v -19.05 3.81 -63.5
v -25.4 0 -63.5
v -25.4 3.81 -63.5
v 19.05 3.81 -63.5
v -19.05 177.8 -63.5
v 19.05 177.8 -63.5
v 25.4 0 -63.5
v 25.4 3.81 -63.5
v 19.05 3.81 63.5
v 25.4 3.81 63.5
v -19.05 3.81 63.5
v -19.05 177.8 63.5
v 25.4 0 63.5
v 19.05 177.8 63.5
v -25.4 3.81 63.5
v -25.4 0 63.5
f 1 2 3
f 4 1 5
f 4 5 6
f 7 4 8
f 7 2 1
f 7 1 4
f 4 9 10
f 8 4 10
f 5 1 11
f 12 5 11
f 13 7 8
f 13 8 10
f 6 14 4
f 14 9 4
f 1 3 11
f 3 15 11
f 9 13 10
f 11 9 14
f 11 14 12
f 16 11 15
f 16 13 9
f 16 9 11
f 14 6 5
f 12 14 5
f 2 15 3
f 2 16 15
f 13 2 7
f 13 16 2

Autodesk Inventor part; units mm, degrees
ref_plane "YZ Plane" through (0, 0, 0) normal (1, 0, 0) x (0, 1, 0)
ref_plane "XZ Plane" through (0, 0, 0) normal (0, 1, 0) x (-1, 0, 0)
ref_plane "XY Plane" through (0, 0, 0) normal (0, 0, 1) x (1, 0, 0)
sketch "Sketch1" plane through (0, 0, 0) normal (0, 1, 0) x (-1, 0, 0)
  line L0 (0, -88.9) -> (0, 88.9) projected
  line L1 (-26.67, 0) -> (26.67, 0) projected
  line L2 (26.67, 0) -> (-26.67, 0) projected
  line L3 (0, -88.9) -> (0, 88.9) projected
  line L4 (19.05, 63.5) -> (-19.05, 63.5)
  line L5 (-19.05, 63.5) -> (-19.05, -63.5)
  line L6 (-19.05, -63.5) -> (19.05, -63.5)
  line L7 (19.05, -63.5) -> (19.05, 63.5)
  line L8 (19.05, 63.5) -> (-19.05, -63.5) construction
  line L9 (-19.05, 63.5) -> (19.05, -63.5) construction
  point P0 (0, 0)
  dimension "d0" = 38.1
  dimension "d1" = 127
extrude "Extrusion1" add sketch "Sketch1" along normal blind 177.8
sketch "Sketch2" plane through (0, 0, 0) normal (0, -1, 0) x (1, 0, 0)
  line L0 (-25.4, -63.5) -> (25.4, -63.5)
  line L1 (25.4, -63.5) -> (25.4, 63.5)
  line L2 (25.4, 63.5) -> (-25.4, 63.5)
  line L3 (-25.4, 63.5) -> (-25.4, -63.5)
  line L4 (-25.4, -63.5) -> (25.4, 63.5) construction
  line L5 (25.4, -63.5) -> (-25.4, 63.5) construction
  point P0 (0, 0)
  dimension "d4" = 50.8
extrude "Extrusion2" add sketch "Sketch2" against normal blind 3.81
properties part number "Netgear Router" material "Acetal Resin, Black"
